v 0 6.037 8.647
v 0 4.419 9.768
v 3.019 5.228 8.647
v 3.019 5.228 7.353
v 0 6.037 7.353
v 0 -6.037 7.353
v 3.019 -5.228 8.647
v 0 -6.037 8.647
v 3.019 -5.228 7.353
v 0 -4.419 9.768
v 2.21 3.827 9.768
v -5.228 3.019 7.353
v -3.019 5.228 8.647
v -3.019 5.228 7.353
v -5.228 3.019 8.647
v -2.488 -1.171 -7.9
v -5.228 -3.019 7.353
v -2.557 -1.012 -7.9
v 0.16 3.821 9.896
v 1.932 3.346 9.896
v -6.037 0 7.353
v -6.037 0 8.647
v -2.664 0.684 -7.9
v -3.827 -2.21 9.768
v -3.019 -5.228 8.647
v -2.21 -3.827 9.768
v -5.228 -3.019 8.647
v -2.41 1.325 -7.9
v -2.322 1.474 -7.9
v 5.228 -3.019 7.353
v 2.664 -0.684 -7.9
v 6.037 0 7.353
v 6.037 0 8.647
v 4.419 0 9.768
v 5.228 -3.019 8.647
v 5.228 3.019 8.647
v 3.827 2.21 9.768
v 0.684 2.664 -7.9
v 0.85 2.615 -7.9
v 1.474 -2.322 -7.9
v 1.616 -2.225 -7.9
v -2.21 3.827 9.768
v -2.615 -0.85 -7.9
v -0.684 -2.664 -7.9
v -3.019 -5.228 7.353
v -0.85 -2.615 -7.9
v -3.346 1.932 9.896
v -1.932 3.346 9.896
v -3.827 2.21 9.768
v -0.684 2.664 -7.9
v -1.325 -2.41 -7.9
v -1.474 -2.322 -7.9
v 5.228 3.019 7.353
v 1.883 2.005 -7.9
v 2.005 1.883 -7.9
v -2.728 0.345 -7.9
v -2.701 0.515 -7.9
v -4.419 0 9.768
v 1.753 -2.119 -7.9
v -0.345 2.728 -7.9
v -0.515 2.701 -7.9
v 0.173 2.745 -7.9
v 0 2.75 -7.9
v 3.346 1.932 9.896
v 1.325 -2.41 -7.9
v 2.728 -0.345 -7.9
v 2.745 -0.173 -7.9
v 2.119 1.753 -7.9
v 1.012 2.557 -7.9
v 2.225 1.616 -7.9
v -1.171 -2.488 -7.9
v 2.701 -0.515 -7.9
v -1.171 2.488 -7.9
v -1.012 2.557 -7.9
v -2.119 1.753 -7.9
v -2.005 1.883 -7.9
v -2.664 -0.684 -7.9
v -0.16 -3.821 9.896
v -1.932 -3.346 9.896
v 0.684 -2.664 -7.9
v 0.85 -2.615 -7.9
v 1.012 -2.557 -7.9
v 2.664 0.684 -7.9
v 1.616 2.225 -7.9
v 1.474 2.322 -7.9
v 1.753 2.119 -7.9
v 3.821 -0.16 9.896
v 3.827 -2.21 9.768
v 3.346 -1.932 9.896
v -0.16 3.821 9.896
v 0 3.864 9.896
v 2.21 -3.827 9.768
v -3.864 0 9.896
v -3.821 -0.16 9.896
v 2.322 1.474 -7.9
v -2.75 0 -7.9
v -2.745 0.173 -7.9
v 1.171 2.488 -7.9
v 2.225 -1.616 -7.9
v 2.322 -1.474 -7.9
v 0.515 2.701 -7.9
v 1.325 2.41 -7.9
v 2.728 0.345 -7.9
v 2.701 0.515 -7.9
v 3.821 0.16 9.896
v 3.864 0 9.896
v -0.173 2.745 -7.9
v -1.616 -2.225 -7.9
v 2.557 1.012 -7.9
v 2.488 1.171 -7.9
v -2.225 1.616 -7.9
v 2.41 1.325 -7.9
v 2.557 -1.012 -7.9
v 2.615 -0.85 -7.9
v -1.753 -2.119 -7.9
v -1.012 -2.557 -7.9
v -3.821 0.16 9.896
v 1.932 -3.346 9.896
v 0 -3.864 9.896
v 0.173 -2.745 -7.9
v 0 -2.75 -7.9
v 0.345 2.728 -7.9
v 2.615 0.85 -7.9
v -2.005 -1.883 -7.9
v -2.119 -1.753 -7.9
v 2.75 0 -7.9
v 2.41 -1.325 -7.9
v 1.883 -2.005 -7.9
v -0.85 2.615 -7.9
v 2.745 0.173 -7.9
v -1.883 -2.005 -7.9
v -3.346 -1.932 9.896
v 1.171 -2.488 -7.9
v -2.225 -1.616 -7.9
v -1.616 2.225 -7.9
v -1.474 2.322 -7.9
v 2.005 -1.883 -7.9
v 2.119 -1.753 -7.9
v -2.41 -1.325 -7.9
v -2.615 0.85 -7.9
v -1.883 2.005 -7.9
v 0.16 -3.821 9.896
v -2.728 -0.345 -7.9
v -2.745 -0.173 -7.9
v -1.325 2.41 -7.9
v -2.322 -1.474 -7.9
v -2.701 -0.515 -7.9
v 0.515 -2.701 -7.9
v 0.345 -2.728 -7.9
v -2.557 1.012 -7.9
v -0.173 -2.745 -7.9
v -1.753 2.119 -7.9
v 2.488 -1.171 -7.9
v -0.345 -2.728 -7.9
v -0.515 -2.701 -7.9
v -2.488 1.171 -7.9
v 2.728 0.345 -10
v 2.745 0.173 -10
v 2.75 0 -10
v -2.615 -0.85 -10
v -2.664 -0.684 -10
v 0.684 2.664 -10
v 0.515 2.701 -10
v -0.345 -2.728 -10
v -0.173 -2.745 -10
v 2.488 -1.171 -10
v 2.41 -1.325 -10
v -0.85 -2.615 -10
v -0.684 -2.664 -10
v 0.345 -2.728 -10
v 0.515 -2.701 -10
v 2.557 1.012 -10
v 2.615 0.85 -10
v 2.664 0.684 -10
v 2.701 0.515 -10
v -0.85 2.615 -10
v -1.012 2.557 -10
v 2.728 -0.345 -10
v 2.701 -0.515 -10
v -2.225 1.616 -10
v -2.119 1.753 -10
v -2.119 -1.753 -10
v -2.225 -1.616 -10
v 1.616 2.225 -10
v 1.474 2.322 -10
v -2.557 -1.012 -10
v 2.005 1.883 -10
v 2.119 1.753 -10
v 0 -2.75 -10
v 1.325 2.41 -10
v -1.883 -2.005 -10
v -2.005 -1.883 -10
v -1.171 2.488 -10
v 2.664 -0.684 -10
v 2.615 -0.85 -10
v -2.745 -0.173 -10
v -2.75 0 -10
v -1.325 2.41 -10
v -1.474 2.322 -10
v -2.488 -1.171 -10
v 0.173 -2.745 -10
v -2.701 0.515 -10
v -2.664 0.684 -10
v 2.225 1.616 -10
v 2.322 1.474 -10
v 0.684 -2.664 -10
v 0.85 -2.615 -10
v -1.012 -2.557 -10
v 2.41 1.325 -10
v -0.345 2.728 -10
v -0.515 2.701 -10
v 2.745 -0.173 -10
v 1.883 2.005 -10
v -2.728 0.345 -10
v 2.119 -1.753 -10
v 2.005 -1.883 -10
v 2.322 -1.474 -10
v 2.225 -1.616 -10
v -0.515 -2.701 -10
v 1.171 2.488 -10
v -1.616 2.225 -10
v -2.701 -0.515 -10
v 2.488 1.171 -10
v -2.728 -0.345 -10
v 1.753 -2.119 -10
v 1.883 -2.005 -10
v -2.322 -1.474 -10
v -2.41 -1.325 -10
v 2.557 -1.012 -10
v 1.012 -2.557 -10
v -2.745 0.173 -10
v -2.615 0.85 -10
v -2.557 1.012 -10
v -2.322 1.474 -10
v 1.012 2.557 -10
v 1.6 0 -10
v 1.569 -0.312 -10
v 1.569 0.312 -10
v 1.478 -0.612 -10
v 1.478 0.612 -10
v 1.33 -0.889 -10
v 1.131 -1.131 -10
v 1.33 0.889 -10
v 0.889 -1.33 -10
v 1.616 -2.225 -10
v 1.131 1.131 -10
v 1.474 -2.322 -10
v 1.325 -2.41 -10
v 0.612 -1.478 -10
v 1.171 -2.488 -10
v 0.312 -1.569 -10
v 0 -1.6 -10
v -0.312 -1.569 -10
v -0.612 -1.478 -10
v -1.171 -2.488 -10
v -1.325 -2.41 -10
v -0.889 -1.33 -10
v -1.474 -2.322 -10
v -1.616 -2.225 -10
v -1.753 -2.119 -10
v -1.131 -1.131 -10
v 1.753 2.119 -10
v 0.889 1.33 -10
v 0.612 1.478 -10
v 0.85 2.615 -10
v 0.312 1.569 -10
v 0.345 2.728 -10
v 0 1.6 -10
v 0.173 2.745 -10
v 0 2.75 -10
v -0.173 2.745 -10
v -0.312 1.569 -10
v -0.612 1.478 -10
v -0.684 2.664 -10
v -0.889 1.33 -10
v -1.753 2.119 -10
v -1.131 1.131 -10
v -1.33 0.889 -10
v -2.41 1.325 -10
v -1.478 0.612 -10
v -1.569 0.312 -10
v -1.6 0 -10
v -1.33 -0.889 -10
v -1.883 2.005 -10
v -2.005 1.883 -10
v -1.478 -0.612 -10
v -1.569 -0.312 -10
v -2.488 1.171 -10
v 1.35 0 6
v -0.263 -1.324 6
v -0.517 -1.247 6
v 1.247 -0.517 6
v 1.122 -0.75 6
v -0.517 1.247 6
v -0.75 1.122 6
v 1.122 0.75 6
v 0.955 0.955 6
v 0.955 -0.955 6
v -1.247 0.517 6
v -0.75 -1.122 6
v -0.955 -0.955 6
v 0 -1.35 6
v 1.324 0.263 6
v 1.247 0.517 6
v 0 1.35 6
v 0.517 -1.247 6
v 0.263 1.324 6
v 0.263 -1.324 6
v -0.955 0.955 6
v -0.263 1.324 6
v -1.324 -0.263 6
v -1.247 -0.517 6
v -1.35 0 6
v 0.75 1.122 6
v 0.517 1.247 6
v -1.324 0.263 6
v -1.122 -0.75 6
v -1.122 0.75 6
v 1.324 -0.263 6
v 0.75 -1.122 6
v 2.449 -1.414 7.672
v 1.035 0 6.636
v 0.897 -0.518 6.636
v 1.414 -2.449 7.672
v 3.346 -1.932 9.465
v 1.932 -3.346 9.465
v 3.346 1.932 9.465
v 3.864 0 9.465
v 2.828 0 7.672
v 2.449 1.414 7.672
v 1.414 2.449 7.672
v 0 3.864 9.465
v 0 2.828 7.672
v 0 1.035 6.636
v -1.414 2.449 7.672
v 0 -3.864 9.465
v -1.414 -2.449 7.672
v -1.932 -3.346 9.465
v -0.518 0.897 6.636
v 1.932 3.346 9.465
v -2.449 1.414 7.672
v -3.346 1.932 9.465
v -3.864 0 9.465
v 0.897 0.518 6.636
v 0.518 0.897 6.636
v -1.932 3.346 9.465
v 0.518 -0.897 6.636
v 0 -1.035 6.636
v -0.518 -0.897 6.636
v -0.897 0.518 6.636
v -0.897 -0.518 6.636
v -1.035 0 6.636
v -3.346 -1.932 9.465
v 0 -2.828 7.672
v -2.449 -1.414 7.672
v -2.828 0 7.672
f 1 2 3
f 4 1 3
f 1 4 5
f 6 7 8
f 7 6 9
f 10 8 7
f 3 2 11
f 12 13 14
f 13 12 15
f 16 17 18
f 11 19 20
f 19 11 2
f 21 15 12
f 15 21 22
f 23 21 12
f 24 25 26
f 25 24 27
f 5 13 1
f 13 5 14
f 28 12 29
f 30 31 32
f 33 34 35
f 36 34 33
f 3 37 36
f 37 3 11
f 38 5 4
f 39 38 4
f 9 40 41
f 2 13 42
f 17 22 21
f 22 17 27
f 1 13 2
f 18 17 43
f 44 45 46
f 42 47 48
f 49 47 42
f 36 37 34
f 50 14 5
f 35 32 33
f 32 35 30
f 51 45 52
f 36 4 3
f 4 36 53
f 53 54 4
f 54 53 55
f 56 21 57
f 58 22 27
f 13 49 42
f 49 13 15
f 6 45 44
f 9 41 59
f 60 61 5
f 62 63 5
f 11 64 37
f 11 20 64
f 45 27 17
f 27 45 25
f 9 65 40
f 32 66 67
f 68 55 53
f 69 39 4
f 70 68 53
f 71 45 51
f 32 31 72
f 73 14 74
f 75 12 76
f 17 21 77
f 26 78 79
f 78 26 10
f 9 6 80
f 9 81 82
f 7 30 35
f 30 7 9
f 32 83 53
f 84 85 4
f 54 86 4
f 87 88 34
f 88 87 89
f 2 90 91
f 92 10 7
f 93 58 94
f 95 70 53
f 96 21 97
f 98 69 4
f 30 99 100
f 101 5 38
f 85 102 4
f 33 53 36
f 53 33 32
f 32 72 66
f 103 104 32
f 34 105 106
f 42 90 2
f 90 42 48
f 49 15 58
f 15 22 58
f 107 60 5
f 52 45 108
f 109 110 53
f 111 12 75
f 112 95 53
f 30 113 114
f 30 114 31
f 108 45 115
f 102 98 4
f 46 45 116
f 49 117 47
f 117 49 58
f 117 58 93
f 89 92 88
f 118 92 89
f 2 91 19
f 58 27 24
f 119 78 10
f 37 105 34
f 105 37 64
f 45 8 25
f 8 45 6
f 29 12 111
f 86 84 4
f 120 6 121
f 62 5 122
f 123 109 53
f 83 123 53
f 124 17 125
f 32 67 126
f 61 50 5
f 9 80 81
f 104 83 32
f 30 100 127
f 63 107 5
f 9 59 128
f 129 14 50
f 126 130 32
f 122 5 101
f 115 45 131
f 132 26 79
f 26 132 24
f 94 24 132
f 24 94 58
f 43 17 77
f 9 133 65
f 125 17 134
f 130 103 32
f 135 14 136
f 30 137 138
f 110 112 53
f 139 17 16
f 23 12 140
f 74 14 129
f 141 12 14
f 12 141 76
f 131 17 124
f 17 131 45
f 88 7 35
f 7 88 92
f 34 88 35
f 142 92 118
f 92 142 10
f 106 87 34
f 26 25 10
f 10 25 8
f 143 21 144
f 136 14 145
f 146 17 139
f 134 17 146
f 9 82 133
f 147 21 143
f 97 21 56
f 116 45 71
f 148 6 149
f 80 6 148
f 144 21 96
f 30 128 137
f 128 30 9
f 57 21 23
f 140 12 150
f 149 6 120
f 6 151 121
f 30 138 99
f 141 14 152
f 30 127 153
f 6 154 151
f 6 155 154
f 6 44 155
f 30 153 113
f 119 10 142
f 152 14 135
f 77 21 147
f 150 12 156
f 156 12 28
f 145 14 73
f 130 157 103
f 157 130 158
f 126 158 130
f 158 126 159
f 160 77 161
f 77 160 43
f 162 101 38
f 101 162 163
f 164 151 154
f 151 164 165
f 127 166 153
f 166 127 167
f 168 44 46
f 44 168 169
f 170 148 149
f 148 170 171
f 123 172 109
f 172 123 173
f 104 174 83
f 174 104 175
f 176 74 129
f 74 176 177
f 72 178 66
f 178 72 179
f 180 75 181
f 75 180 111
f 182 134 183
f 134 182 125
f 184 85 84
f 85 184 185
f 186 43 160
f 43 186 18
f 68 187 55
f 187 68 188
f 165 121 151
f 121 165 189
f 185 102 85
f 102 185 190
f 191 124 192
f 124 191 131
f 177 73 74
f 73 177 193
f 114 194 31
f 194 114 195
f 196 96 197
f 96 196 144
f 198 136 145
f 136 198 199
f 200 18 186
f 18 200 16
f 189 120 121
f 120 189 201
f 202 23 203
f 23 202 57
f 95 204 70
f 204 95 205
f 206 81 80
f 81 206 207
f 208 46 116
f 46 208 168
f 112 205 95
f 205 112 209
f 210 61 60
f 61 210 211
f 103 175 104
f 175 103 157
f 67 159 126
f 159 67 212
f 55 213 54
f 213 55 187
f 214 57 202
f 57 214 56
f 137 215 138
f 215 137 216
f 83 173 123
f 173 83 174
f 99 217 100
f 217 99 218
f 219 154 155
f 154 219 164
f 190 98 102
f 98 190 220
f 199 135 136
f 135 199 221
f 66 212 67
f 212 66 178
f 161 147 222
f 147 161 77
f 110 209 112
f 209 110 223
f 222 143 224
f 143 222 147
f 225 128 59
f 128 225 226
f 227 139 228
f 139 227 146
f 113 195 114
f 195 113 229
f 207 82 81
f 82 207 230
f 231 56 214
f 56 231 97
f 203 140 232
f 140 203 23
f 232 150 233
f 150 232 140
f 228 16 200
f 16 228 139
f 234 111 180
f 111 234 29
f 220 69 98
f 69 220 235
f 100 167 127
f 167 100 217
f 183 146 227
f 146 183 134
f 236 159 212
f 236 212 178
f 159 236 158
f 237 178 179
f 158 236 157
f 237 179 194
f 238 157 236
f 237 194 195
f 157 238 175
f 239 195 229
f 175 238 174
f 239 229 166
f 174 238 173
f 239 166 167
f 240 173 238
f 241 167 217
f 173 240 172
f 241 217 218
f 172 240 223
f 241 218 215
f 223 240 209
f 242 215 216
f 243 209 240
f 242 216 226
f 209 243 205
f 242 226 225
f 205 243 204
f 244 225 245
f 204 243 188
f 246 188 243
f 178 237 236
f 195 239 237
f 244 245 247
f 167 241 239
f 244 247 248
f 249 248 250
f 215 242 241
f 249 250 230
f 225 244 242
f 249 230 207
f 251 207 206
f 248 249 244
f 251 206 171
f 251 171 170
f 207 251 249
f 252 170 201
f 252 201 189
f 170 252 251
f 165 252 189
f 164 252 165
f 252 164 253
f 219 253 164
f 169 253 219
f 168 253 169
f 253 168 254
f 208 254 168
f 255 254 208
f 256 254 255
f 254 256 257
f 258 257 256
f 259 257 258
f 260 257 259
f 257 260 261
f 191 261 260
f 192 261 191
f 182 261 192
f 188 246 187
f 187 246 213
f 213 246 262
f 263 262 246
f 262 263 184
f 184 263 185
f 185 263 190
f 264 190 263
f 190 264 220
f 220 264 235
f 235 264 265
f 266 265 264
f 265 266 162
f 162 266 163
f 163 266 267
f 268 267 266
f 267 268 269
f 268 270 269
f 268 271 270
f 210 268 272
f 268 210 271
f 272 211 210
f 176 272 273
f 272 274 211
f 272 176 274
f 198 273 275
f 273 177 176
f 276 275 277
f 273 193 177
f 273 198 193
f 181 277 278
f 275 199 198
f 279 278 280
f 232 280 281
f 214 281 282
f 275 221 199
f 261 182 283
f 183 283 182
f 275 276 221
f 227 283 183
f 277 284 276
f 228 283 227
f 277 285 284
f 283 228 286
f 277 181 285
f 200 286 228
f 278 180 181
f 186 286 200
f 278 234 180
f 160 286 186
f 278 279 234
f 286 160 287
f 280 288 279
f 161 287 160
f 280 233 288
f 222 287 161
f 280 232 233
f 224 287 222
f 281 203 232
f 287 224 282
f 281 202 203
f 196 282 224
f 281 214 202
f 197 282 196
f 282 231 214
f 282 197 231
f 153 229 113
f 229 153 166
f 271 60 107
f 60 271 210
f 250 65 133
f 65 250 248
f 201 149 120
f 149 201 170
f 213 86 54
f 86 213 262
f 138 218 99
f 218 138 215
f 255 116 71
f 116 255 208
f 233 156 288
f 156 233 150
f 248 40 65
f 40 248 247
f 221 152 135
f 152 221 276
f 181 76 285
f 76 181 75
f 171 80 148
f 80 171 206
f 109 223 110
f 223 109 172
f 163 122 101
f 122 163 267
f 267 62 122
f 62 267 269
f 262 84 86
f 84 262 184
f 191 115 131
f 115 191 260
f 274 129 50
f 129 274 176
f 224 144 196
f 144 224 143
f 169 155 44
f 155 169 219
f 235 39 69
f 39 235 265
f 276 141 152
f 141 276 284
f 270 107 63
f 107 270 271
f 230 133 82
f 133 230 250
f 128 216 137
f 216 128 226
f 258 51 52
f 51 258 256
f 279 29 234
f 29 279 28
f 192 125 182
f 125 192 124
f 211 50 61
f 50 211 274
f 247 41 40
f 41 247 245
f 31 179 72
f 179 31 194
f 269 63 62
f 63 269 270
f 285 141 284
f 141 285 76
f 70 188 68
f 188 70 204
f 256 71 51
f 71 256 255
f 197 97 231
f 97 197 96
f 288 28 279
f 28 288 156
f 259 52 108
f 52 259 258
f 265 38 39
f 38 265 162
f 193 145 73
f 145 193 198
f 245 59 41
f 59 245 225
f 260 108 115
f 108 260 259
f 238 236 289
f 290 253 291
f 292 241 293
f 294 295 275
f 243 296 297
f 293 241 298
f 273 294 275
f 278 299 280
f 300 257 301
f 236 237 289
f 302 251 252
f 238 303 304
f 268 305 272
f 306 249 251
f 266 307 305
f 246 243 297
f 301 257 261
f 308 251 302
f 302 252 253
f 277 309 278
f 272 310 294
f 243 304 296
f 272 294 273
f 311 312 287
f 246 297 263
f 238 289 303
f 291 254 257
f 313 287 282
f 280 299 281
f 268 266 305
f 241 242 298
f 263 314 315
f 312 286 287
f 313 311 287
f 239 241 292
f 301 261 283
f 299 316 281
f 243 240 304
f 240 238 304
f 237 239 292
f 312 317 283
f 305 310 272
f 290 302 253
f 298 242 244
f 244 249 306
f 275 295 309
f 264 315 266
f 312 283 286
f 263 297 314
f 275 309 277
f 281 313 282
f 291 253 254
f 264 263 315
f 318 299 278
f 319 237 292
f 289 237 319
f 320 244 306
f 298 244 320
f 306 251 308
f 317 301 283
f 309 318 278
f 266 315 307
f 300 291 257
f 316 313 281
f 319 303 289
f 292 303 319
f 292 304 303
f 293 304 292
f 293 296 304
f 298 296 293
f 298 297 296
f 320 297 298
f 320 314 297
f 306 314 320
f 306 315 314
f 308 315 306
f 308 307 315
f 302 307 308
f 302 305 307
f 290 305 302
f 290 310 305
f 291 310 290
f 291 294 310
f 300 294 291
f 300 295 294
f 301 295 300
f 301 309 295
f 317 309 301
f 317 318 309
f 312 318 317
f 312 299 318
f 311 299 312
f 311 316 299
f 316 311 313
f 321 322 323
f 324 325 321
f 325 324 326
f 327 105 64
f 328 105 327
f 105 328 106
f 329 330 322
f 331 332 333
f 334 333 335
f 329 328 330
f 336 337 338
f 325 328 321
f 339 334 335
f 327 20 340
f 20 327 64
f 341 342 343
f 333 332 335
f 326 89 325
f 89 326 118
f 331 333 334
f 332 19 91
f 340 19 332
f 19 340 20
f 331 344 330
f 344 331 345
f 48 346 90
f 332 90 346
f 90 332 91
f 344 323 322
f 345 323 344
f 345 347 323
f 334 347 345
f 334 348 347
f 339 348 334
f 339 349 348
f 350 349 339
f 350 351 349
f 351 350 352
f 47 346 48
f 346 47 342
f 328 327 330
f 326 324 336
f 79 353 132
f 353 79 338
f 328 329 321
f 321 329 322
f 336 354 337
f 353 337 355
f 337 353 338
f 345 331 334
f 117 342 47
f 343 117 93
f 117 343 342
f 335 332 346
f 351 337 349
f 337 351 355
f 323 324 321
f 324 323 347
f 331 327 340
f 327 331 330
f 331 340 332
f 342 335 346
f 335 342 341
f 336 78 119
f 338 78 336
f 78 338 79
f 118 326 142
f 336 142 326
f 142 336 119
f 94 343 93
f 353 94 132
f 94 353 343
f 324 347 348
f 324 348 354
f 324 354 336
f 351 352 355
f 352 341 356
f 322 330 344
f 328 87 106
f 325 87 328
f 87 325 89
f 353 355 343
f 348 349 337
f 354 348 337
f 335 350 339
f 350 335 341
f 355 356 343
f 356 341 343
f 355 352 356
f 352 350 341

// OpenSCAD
/*
Customizable Thumbsticks for replacing/improving controllers.

    Harlo ~ 07/05/2016.
*/

//Inside Cut Height
inner_cut_length = 16; //[0:0.5:50]
//Inside Cut Diameter
inner_dia = 3.2; //[0:0.1:10]
//Inside Cut Resolution (4 for square)
inner_resolution = 32; //[4:1:120]

//Collar Height (Lower Cylinder)
lower_length = 4; //[0:0.25:10]
//Collar Diameter (OD)
lower_dia = 5.5; //[1:0.25:20]
//Collar Resolution
collar_resolution = 100; //[4:1:120]

//Overall Height
total_length = 20; //[10:0.25:50]
//Thumbstick Diameter
upper_dia = 12.5; //[5:0.25:25]
//Thumbstick Resolution
thumbstick_resolution = 12; //[8:1:120]

//Thumb Recess Diameter 
dimple_dia = 8; //[0:0.5:20]







upper_length = total_length - lower_length;


difference(){
    thumbstick();
    inner_cutout();
    top_dimple();
}

module inner_cutout(){
    //-inner_cut_length/2
    translate([0,0,-(total_length/2 - inner_cut_length/2)]){
        cylinder(h = inner_cut_length, d1 = inner_dia, d2 = inner_dia - 0.5, center = true, $fn = inner_resolution);
    }
    
}

module top_dimple(){
    translate([0,0,2.5 + upper_length/2]){
        scale([1,1,1]){
            sphere(d = dimple_dia, $fn = thumbstick_resolution, center = true);
        }
    }
}

module thumbstick(){
    upper();
    translate([0,0,-upper_length/2]){
        attachment();
    }
}



module upper(){
    hull(){
        translate([0,0,upper_length/2]){
            scale([1,1,0.4]){
                sphere(d = upper_dia, $fn = thumbstick_resolution);
            }
        }
        
        translate([0,0,-(upper_length/2 - 0.1)]){
        cylinder(h = 0.1, d = lower_dia, $fn = collar_resolution);
        }
    }   
}

module attachment(){

        cylinder(h = lower_length, d = lower_dia, $fn = collar_resolution, center = true);

}
